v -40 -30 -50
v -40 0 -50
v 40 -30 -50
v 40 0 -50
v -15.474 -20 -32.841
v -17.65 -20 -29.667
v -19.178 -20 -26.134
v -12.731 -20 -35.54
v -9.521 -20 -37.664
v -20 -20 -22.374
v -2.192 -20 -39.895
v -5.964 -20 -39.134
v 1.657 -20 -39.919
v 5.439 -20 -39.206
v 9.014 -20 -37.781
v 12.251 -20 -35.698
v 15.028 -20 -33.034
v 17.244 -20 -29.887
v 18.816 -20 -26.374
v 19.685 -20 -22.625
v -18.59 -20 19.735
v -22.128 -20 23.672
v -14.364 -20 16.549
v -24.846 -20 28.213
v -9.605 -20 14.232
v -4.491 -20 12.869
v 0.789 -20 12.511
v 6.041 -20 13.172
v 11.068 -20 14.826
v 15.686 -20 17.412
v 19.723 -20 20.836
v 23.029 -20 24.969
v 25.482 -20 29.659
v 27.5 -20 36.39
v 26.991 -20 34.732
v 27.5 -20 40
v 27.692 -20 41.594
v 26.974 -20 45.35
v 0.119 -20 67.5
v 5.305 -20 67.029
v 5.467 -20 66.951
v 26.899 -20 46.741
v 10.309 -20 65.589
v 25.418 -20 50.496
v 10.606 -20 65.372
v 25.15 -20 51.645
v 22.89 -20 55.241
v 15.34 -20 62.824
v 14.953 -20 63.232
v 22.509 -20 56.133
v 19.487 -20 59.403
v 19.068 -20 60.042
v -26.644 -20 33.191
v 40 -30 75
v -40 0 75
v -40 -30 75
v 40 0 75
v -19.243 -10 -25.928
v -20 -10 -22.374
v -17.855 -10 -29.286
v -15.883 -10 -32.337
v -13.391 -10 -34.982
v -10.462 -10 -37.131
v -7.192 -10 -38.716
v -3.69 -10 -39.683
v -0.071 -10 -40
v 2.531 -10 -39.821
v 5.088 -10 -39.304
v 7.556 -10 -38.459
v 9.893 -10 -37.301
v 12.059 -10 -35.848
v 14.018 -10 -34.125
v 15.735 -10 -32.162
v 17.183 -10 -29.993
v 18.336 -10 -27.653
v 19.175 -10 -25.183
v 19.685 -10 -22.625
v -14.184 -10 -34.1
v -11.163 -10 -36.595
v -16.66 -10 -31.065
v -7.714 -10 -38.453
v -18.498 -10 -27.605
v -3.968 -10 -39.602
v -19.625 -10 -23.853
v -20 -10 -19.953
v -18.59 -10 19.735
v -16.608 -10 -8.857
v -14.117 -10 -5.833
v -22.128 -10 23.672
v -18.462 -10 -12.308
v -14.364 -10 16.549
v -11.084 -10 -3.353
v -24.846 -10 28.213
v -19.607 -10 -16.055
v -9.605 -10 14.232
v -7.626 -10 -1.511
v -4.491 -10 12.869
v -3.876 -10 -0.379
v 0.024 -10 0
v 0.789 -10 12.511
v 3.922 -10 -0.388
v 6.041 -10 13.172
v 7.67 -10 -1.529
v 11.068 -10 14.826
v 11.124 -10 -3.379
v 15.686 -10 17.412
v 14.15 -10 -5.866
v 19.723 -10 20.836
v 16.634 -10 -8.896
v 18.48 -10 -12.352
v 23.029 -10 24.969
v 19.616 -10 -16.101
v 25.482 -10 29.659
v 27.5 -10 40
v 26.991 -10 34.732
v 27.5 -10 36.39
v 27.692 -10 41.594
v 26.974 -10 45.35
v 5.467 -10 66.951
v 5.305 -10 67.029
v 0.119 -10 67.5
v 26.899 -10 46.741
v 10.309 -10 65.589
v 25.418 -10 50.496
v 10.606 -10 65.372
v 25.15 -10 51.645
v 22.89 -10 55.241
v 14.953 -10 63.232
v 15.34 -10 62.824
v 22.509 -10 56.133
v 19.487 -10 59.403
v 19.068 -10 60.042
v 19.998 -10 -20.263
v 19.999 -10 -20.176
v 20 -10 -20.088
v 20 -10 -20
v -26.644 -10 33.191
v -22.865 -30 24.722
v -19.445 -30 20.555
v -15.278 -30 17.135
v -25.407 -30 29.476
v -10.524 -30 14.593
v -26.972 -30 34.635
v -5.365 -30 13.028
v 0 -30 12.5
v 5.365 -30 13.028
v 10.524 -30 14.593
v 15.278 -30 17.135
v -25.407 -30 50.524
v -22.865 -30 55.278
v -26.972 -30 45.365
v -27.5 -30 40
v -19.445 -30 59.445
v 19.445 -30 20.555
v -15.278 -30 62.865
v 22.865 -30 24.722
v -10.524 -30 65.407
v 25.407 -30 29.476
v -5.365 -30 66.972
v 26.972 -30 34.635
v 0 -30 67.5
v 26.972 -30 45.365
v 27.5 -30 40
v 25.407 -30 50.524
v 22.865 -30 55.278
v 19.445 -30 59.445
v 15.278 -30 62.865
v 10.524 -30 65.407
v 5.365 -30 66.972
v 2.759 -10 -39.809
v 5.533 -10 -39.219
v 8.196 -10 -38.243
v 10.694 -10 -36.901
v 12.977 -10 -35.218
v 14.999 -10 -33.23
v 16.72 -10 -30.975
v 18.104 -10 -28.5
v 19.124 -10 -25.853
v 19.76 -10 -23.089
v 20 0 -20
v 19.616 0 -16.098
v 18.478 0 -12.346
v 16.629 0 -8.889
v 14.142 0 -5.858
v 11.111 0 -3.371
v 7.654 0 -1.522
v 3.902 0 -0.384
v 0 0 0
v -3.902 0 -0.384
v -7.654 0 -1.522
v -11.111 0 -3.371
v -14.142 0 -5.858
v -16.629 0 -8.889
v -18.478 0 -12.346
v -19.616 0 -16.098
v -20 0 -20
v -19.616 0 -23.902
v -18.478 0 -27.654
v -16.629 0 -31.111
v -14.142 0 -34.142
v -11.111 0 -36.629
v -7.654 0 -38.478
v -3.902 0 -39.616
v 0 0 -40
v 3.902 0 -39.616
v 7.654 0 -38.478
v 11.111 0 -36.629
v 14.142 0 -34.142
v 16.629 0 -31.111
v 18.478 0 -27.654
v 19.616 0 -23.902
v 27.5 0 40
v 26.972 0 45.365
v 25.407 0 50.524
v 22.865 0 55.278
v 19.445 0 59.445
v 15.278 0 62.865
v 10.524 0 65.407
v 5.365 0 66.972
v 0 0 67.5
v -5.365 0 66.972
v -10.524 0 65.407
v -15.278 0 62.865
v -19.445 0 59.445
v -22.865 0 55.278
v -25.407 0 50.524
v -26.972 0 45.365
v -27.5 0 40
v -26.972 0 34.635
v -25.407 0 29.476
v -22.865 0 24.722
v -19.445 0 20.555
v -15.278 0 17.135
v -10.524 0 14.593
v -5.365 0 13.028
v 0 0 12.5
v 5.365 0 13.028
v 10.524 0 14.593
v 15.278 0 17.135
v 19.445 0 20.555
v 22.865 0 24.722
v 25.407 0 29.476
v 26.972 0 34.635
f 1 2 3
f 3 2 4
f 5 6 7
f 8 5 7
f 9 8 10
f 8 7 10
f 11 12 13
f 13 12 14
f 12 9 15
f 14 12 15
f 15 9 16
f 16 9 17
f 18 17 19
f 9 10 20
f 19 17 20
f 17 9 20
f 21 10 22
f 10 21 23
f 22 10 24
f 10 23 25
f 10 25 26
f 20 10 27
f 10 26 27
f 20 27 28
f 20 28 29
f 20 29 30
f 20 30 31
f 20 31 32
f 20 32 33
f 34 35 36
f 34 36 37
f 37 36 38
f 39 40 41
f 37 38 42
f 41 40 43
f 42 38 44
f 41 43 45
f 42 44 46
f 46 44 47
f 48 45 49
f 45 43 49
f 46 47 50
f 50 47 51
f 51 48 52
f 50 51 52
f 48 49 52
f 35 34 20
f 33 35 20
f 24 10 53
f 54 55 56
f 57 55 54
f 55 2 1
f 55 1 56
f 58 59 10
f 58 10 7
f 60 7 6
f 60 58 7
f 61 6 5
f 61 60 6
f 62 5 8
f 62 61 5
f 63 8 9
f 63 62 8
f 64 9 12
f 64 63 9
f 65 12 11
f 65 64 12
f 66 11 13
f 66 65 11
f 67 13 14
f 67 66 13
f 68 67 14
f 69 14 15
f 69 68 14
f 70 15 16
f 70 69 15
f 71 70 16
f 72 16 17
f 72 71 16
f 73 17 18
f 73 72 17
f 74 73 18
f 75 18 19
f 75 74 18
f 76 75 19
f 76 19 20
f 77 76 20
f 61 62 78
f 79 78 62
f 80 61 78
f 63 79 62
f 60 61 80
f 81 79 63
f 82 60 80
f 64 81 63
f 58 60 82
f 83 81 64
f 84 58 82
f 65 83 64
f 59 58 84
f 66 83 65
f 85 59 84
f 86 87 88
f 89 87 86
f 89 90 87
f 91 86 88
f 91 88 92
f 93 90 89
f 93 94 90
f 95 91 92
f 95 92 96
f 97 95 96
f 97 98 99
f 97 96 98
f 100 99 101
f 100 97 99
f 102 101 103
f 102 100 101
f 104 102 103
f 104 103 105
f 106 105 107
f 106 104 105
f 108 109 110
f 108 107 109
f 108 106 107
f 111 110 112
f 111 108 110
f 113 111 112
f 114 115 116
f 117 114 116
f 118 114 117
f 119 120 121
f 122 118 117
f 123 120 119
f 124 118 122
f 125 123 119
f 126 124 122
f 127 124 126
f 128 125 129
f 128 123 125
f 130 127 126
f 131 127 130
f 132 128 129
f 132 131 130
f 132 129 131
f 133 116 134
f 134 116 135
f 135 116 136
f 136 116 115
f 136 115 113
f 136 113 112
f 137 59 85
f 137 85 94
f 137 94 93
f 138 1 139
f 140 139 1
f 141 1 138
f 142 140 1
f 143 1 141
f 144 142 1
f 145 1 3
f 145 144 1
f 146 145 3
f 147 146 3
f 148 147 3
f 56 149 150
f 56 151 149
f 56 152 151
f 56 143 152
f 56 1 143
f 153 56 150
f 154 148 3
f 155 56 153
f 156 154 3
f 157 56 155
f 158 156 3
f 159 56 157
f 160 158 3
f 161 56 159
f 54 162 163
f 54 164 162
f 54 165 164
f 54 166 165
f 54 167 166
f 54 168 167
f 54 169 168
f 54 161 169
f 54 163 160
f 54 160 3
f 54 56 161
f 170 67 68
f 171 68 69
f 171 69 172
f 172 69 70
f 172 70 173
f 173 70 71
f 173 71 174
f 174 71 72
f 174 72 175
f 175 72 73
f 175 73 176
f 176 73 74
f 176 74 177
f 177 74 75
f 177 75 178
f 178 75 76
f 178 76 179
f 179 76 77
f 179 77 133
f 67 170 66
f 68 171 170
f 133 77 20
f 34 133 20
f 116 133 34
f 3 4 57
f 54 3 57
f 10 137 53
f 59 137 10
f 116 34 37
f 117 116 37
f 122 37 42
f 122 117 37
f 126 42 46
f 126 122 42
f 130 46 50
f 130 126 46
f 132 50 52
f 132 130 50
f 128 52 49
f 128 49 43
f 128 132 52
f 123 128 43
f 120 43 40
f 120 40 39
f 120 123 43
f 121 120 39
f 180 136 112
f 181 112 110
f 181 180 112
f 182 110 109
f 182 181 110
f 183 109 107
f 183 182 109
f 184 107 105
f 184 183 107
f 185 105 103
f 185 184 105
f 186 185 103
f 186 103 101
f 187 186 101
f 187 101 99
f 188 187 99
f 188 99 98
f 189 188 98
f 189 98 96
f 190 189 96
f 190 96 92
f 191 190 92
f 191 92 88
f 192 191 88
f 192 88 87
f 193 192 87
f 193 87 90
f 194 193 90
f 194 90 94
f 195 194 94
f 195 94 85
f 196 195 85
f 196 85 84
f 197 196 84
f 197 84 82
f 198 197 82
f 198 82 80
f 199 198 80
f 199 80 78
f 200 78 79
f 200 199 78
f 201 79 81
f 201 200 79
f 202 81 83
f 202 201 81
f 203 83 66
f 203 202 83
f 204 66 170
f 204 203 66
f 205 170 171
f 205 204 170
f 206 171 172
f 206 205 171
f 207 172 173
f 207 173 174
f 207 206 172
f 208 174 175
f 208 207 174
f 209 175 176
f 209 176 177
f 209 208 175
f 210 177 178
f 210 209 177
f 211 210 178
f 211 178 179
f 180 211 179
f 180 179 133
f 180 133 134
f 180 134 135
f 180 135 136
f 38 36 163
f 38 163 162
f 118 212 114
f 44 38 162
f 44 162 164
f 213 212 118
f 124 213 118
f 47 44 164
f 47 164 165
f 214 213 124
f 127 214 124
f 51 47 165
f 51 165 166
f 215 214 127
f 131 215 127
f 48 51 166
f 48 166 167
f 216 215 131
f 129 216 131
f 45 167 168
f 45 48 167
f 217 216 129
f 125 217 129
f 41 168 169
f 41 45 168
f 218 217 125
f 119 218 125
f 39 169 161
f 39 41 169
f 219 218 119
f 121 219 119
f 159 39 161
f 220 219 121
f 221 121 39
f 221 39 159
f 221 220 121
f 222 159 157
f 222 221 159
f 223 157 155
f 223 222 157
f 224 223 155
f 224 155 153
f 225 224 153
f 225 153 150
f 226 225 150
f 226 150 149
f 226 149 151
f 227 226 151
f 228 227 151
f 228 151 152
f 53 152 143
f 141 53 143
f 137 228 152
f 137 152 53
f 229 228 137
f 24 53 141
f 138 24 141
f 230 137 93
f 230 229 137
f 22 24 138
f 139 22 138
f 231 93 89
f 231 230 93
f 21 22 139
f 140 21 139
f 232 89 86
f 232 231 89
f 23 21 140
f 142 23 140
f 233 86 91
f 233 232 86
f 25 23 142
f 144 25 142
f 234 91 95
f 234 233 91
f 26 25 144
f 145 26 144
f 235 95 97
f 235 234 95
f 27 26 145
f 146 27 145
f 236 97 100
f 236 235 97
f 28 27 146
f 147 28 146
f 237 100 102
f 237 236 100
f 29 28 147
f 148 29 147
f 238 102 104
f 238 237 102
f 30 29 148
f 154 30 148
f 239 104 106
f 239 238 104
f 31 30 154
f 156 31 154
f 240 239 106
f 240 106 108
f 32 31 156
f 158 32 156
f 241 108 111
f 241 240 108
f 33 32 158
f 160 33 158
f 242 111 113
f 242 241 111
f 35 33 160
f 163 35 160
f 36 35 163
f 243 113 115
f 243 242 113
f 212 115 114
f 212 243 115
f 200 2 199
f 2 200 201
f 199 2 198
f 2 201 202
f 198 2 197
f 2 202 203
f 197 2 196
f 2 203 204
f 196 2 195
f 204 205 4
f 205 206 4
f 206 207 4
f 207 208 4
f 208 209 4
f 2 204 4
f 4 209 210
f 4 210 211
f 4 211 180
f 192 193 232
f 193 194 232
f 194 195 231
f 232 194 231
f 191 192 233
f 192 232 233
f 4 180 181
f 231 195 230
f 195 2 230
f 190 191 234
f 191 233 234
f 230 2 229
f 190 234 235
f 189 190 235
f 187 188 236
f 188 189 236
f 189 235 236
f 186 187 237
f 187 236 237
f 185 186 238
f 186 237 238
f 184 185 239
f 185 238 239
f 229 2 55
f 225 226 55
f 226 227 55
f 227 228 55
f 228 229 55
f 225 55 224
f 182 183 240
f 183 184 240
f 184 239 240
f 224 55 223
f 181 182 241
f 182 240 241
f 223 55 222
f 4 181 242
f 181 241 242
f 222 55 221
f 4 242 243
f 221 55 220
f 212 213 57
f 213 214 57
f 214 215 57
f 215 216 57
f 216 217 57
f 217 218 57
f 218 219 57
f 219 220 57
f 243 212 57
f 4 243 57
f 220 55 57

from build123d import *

# Parameters (mm, degrees)
F2_W     = 80
F2_H     = 125
F2_R     = 27.5
F3_DEPTH = 30
F4_START = 10
F4_DEPTH = 10
F1_R     = 20
F5_DEPTH = 10


with BuildPart() as f3:
    # F2 (on Front) → F3 (new body)
    with BuildSketch(Plane.XZ):
        with Locations((0, 12.5)):
            Rectangle(F2_W, F2_H)
        with Locations((0, 40)):
            Circle(F2_R, mode=Mode.SUBTRACT)
    extrude(amount=F3_DEPTH)

    # F0 (on Front) → F4 (cut)
    with BuildSketch(Plane.XZ.offset(F4_START)):
        with BuildLine():
            ThreePointArc((27.5, 36.3901084755), (0.4118554049, 67.4994501998), (-27.0675471314, 36.7351664218))
            Line((-27.0675471314, 36.7351664218), (-20, -22.3744244205))
            ThreePointArc((-20, -22.3744244205), (-0.2679149621, -39.9996001453), (19.6854888228, -22.6253756542))
            Line((19.6854888228, -22.6253756542), (27.5, 36.3901084755))
        make_face()
    extrude(amount=F4_DEPTH, mode=Mode.SUBTRACT)

    # F1 (on Front) → F5 (cut)
    with BuildSketch(Plane.XZ):
        with Locations((0, -20)):
            Circle(F1_R)
    extrude(amount=F5_DEPTH, mode=Mode.SUBTRACT)


solid = f3.part
